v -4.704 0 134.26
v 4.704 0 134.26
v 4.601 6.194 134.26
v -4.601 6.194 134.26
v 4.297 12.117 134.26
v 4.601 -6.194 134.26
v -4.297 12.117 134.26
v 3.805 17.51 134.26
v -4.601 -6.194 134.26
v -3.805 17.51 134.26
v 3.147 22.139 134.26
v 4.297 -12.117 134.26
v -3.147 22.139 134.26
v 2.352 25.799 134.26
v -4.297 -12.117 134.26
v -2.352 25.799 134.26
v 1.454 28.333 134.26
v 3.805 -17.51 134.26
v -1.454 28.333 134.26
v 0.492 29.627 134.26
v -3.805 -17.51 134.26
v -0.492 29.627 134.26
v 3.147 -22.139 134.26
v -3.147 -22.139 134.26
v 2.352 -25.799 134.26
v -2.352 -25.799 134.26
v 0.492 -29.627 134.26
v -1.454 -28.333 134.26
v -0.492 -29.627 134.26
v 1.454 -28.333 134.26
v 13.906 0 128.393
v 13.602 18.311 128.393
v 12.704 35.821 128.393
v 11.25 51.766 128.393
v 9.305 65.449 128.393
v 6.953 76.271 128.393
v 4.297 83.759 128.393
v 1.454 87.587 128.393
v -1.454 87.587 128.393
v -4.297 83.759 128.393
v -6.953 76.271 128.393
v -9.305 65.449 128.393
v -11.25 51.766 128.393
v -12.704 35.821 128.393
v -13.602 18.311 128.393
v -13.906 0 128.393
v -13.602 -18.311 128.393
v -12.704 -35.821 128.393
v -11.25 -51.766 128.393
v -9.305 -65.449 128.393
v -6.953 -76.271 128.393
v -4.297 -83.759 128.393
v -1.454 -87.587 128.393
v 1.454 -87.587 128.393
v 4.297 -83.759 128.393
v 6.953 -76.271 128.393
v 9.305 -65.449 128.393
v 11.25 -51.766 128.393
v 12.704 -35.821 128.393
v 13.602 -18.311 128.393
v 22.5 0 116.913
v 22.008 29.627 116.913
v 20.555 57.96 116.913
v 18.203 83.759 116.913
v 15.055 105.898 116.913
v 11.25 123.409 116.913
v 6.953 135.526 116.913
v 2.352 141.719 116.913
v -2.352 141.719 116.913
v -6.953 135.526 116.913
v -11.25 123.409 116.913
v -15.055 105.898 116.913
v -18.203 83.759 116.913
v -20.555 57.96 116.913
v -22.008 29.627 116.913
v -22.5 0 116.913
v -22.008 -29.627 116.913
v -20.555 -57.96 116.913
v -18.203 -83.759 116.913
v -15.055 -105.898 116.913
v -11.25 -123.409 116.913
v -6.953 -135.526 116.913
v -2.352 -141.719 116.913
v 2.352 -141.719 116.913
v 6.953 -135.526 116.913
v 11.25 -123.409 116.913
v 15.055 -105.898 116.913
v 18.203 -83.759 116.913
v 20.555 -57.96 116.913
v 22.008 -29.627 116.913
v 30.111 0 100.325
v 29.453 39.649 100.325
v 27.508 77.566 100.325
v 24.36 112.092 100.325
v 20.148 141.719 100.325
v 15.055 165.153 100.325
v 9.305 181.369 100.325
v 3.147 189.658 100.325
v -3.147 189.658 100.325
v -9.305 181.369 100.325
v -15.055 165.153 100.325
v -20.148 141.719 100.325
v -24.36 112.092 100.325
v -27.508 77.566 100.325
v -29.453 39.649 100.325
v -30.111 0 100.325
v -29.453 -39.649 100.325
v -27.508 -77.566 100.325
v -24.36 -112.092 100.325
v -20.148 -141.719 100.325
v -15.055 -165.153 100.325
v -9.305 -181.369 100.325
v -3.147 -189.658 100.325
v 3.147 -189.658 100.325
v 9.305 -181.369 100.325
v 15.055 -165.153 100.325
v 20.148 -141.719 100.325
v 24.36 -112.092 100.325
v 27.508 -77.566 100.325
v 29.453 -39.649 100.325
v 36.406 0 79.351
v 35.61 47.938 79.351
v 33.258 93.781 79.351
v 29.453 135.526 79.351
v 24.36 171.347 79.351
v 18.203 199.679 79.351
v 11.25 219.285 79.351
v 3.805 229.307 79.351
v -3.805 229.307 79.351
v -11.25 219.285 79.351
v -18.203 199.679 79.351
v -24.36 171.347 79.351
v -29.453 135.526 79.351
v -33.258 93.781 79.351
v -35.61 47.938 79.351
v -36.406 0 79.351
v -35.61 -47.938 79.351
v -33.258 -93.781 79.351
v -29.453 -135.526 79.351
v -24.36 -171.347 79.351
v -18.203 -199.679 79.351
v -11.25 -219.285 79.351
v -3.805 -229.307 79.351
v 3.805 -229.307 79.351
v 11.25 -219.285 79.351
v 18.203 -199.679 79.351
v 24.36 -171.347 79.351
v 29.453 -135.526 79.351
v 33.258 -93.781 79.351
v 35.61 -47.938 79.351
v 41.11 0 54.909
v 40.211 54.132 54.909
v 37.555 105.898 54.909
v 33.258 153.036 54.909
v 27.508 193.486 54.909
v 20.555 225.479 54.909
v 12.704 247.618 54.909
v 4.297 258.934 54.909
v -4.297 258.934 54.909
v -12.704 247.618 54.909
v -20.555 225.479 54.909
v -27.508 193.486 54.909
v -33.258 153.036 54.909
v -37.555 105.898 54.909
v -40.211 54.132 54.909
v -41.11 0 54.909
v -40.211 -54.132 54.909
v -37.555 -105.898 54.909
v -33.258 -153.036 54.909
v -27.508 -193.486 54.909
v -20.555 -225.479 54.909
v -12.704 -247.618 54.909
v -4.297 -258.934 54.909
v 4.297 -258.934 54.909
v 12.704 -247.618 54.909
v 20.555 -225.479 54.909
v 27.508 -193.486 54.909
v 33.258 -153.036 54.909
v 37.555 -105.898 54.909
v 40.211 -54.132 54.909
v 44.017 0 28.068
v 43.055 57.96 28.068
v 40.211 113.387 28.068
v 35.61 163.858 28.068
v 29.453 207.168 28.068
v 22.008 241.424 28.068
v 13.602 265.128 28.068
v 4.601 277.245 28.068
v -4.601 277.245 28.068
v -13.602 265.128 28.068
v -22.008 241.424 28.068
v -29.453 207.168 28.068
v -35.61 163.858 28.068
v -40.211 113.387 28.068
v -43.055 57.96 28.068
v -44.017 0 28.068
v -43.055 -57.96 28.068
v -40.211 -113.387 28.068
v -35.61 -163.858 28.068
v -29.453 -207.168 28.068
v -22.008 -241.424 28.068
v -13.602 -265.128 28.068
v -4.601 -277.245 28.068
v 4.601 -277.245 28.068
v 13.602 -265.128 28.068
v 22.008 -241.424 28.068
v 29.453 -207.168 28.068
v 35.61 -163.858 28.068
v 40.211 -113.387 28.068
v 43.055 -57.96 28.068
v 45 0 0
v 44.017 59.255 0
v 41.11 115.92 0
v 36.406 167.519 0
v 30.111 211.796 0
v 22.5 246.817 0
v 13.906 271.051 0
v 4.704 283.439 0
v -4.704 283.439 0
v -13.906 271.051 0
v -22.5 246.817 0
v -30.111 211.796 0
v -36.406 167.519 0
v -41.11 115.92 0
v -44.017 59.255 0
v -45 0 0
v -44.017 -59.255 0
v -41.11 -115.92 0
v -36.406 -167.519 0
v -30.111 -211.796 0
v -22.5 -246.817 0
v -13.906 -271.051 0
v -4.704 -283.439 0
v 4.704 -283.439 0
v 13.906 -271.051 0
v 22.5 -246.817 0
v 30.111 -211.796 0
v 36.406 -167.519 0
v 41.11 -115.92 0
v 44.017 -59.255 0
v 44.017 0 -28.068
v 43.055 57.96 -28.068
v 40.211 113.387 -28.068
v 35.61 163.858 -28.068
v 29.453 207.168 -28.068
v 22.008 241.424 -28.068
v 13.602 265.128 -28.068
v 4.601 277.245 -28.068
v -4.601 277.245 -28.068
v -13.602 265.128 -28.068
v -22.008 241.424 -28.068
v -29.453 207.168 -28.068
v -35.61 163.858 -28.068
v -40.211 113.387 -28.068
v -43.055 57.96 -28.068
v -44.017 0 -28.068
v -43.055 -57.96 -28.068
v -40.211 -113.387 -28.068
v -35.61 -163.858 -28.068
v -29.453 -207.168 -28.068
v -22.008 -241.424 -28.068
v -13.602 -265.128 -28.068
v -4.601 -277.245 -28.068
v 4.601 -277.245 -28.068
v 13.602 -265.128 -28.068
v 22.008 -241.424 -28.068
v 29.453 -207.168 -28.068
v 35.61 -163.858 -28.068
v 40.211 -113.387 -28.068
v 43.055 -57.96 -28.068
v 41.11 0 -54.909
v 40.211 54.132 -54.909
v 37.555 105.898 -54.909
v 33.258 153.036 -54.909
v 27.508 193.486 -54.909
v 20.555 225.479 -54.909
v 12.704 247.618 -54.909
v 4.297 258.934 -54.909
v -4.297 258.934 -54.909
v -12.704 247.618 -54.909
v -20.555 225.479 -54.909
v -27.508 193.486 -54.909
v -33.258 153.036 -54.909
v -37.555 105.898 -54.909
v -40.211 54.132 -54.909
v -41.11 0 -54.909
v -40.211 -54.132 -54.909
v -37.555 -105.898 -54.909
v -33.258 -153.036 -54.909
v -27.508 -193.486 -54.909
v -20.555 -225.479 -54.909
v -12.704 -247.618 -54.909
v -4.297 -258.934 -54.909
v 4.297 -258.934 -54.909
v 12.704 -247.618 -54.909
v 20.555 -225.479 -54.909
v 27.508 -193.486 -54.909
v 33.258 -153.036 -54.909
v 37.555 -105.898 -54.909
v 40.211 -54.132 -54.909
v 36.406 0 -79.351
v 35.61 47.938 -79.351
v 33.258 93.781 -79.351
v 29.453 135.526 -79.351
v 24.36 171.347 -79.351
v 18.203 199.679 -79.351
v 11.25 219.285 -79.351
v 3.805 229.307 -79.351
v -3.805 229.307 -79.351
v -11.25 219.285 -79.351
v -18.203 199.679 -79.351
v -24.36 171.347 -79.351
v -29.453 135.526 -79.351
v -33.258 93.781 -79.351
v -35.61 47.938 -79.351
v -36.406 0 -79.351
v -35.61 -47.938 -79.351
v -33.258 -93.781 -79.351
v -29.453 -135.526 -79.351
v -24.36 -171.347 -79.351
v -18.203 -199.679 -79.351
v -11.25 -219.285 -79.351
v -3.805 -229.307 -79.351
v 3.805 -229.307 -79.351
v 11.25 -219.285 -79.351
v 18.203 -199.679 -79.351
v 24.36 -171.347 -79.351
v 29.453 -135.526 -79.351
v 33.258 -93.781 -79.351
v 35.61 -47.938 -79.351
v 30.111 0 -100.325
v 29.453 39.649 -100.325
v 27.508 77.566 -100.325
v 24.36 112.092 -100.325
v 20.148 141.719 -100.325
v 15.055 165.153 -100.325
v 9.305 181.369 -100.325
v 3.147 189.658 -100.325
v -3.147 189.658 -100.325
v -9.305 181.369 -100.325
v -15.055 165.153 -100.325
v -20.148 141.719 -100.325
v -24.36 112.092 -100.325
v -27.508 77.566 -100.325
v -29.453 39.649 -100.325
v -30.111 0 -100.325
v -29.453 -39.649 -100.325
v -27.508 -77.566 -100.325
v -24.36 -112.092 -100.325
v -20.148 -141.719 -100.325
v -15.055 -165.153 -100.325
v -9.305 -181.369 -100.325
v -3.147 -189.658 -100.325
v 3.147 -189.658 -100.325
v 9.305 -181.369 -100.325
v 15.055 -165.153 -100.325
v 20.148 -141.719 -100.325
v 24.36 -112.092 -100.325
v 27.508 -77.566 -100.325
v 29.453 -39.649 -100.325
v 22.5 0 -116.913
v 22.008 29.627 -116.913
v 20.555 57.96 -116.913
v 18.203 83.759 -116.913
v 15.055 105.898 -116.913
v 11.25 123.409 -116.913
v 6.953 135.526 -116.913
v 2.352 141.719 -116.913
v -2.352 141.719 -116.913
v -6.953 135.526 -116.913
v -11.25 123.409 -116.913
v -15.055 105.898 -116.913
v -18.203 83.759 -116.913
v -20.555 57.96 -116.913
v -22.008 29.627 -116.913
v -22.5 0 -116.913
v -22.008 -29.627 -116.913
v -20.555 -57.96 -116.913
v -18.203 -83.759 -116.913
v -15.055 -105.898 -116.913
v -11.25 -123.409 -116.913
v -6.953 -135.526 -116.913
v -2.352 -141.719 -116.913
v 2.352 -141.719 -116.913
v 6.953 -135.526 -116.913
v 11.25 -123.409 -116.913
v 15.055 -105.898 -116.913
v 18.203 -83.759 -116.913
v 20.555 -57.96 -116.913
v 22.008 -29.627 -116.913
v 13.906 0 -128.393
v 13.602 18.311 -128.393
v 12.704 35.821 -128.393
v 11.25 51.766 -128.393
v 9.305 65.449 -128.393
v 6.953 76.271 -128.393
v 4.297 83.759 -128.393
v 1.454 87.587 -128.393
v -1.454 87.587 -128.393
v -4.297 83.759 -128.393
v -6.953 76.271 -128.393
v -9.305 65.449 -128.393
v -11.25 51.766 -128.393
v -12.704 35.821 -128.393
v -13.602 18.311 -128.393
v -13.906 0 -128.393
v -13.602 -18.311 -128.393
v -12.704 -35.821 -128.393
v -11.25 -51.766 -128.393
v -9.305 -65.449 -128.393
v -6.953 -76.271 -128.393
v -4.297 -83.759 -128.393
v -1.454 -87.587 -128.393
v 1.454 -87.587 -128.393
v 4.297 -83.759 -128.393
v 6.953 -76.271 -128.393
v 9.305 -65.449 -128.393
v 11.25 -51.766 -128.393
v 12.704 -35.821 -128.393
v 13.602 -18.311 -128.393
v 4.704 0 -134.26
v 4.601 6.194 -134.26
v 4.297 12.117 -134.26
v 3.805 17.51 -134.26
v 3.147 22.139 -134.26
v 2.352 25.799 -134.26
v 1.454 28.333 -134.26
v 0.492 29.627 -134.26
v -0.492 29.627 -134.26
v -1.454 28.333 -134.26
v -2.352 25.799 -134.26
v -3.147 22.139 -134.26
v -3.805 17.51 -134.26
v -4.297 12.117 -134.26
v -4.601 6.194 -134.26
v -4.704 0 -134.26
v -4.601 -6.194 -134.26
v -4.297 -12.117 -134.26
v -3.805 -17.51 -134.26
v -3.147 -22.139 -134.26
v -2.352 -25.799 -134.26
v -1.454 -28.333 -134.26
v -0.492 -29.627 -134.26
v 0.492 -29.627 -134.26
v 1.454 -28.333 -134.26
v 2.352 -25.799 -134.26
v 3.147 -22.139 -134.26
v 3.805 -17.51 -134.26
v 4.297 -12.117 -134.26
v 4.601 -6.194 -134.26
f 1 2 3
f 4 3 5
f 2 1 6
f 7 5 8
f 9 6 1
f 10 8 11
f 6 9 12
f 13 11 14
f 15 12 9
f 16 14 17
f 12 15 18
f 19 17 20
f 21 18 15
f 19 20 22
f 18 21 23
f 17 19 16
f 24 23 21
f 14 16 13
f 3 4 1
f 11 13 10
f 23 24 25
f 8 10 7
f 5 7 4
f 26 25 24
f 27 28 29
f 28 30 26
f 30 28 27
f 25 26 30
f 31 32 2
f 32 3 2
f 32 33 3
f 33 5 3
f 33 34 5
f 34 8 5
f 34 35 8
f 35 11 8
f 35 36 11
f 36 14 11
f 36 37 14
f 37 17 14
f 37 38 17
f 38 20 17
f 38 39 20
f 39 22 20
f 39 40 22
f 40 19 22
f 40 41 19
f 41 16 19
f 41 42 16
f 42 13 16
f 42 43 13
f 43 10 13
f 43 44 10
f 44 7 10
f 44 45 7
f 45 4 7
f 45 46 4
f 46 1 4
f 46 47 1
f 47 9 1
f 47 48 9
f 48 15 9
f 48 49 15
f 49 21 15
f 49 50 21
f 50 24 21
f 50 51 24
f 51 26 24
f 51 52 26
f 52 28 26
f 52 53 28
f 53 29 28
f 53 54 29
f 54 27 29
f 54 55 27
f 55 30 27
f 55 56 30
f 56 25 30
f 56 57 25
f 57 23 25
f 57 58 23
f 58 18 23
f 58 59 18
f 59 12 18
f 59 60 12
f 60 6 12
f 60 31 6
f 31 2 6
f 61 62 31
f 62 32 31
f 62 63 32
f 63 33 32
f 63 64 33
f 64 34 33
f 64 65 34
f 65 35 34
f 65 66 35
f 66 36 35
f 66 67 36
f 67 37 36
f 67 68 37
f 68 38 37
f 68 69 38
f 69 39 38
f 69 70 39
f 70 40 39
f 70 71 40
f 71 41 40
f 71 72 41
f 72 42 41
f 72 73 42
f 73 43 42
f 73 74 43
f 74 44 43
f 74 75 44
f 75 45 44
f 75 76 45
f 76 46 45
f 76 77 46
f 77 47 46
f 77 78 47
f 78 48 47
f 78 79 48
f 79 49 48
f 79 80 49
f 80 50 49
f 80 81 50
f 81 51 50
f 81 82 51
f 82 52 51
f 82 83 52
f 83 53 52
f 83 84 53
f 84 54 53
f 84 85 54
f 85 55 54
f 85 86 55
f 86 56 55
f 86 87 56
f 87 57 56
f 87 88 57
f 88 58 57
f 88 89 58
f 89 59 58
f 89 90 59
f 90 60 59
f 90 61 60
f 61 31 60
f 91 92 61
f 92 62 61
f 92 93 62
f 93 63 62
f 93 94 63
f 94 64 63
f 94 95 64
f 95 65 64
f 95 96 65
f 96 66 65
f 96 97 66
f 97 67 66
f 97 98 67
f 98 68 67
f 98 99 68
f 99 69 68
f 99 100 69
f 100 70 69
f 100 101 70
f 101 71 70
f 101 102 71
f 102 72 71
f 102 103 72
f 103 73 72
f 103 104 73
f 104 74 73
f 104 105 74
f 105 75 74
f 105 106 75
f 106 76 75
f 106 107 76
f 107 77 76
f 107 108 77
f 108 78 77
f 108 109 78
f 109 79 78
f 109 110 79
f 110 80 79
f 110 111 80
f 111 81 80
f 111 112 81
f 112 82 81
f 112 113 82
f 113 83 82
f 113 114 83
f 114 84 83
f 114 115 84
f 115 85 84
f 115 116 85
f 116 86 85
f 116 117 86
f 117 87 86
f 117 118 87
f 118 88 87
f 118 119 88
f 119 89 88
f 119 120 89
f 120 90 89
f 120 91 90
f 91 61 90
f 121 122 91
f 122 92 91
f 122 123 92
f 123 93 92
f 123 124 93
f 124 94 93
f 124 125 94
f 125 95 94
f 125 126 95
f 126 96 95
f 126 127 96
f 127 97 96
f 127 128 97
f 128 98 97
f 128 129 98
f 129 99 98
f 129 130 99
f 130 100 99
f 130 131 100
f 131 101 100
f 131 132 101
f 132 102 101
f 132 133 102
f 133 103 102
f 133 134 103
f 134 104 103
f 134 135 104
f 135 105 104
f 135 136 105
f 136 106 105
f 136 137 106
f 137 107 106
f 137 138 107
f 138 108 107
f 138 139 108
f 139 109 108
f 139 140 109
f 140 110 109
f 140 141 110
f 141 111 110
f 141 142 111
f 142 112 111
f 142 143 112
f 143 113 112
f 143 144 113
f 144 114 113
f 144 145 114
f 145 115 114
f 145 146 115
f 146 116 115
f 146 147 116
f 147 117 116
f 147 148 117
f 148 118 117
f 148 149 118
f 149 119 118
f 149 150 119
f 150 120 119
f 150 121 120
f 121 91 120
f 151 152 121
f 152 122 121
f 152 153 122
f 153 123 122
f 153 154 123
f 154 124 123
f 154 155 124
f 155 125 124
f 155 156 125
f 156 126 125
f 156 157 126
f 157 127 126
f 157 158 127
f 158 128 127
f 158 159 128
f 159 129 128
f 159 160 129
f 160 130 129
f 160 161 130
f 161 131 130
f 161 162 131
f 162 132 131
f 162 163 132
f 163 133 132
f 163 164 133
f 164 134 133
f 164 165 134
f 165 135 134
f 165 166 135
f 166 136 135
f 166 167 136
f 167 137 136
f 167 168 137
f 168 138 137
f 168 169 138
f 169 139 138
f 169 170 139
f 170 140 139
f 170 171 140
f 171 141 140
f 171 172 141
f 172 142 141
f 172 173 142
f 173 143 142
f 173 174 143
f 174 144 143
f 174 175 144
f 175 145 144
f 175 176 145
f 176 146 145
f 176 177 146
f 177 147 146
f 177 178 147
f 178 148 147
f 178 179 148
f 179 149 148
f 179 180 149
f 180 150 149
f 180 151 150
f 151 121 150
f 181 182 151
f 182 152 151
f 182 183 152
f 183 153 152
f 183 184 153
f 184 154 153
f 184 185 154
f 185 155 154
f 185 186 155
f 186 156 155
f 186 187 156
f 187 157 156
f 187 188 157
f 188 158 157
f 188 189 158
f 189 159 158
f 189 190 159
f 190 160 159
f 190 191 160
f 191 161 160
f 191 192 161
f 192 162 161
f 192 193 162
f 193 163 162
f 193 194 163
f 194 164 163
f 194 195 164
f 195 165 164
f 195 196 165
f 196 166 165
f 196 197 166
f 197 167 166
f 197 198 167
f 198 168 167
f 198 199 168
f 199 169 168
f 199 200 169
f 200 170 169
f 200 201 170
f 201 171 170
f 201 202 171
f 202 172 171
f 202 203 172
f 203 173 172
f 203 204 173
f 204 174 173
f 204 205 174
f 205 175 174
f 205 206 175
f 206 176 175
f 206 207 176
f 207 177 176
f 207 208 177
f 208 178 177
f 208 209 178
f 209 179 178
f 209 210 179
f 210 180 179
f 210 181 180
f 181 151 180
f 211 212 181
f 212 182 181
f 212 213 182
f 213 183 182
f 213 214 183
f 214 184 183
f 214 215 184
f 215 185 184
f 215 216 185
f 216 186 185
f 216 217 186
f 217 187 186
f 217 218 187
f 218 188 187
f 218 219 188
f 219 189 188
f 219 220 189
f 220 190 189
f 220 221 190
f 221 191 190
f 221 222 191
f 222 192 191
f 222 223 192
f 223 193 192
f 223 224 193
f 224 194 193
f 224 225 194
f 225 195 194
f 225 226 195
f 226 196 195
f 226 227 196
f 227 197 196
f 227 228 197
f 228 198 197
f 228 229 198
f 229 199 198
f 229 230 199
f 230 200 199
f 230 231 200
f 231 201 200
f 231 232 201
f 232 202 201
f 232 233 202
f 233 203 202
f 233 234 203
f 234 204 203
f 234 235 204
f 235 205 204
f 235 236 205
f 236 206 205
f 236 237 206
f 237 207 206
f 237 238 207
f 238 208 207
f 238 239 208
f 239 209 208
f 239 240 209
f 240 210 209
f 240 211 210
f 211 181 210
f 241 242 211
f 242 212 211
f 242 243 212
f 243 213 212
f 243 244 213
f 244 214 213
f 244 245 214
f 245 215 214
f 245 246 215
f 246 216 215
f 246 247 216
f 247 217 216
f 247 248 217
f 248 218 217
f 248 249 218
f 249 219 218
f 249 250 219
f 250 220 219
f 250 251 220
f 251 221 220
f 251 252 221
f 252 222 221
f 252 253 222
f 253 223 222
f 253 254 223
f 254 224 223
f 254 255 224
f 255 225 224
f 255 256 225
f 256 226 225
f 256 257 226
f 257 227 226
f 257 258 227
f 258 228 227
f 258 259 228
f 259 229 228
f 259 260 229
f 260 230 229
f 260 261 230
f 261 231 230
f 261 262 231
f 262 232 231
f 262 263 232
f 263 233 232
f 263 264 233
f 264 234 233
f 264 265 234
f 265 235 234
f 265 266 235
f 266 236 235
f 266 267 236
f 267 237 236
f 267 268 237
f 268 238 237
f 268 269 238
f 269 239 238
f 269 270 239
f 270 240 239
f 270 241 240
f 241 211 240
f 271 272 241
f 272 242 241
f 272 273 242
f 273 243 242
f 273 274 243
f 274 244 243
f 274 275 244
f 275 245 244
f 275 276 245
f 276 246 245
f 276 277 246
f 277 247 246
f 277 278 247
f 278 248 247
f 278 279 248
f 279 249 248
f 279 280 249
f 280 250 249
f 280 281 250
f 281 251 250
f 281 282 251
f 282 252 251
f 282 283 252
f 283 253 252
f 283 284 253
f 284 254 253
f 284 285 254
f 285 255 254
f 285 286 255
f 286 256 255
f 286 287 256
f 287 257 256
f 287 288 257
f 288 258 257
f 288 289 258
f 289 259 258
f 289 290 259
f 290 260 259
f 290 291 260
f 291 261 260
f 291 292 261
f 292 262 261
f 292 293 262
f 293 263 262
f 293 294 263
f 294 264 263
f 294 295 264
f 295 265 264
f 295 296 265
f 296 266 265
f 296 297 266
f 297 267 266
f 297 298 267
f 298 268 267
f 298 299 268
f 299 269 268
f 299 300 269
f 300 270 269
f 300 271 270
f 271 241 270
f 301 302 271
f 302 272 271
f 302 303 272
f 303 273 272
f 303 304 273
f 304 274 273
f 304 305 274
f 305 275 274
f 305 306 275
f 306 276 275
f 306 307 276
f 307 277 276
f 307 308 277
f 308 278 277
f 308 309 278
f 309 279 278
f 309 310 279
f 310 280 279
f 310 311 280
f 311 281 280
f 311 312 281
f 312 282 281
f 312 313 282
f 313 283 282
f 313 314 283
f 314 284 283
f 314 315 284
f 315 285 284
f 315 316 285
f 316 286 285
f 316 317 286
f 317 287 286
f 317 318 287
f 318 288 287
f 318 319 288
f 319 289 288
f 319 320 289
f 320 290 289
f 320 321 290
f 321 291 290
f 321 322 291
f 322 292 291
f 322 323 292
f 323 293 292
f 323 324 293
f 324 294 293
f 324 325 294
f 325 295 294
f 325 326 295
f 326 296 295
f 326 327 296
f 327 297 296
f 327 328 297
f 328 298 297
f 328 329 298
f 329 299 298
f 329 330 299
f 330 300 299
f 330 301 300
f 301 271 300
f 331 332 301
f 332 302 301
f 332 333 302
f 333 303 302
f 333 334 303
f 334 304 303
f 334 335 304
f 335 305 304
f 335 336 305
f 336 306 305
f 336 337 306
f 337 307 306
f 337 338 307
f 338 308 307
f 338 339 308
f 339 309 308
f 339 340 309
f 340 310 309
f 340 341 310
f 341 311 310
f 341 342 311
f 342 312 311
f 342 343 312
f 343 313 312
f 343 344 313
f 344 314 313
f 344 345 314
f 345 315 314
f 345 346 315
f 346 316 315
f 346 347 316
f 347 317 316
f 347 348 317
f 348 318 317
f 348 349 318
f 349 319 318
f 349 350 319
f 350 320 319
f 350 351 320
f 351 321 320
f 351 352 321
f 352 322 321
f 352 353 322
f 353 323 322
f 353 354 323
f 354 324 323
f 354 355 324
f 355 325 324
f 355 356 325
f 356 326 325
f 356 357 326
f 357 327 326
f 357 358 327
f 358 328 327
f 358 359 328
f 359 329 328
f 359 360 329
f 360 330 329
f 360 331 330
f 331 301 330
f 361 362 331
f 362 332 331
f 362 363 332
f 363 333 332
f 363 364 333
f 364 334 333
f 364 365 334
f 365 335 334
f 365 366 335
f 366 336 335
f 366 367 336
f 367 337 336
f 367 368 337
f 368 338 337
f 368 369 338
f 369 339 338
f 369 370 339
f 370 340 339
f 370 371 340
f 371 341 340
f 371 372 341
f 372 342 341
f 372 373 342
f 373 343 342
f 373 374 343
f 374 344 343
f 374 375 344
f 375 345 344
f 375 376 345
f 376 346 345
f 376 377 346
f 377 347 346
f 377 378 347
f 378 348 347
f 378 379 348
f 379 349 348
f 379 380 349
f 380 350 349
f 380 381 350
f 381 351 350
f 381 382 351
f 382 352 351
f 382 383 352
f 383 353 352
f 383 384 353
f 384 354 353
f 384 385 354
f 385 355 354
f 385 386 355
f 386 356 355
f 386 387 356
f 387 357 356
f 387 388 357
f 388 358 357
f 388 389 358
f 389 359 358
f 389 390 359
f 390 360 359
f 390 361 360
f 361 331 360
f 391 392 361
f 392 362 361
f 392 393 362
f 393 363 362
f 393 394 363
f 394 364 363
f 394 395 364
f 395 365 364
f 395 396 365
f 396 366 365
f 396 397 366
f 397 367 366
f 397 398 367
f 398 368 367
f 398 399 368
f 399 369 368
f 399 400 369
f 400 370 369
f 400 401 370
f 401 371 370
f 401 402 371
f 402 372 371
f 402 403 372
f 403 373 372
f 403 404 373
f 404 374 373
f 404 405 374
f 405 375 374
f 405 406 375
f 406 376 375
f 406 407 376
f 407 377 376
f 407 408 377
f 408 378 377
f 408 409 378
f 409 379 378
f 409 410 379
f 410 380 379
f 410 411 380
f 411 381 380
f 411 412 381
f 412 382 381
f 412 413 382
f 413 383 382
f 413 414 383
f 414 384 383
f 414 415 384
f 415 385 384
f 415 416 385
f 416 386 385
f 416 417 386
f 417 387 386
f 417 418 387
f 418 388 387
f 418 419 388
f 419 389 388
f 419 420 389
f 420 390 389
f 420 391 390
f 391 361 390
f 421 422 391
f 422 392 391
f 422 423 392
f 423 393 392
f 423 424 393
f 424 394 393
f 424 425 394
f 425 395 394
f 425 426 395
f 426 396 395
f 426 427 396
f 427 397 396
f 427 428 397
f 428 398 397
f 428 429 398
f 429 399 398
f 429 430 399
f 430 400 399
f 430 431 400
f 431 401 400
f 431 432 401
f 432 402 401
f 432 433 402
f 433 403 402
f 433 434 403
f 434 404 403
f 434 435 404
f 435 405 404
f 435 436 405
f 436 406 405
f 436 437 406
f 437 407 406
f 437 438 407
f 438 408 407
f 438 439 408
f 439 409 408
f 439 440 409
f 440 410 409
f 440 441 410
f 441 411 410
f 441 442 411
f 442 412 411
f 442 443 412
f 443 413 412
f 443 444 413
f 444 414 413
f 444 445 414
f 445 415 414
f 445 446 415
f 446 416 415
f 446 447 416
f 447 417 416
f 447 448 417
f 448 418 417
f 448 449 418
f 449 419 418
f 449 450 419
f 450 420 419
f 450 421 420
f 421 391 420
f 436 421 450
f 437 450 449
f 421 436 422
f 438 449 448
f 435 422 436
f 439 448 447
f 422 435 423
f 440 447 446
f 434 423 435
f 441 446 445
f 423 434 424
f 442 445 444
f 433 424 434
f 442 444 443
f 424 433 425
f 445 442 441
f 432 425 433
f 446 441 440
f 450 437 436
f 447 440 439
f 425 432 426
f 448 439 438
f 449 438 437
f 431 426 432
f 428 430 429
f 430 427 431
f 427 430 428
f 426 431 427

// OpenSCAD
// Generated by SolidPython 1.0.1 on 2020-07-29 00:46:46


scale(v = [3, 19, 9]) {
	sphere(r = 15);
}
/***********************************************
*********      SolidPython code:      **********
************************************************
 
# import packages: SolidPython
from solid import *
from solid.utils import *
from itertools import chain, combinations, permutations


class Resize:

    def __init__(self, scad_file):
        self.scad_file = scad_file
        #self.scad_file = import_scad(scad_file)
        # cone/cylinder param:
        self.r1 = 0
        self.r2 = 0
        self.h = 0
        # rectangular prism param:
        self.w = 0
        self.l = 0
        # ellipse param:
        self.r = 0

    # import OpenScad code (file name corresponds to shape)


    # classify shape + parameters
    def assign(self, param1, param2, param3):
        if self.scad_file == 'cone.scad':
            self.r1 = param1
            self.r2 = param2
            self.h = param3
        elif self.scad_file == 'cylinder.scad':
            self.r1 = param1
            self.r2 = param2
            self.h = param3
        elif self.scad_file == 'rectangularPrism.scad':
            self.h = param1
            self.l = param2
            self.w = param3
        else:
            self.r = param1
            self.h = param2

    # resize parameters
    def iterate(self):
        x = range(3, 20, 2)
        i = 1
        if self.scad_file == 'cone.scad':
            tempList = list(permutations(x, 2))
            for temp in tempList:
                param1 = temp[0]
                param2 = temp[1]
                filepath = 'produced_scad_files/' + 'cone' + str(param1) + '_' + str(param2) + '_' + '.scad'
                scad_render_to_file(cylinder(h=param1, r1=param2, r2=0), filepath)

        elif self.scad_file == 'cylinder.scad':
            tempList = list(permutations(x, 3))
            for temp in tempList:
                param1 = temp[0]
                param2 = temp[1]
                filepath = 'produced_scad_files/' + 'cylinder' + str(param1) + '_' + str(param2) + '_' + '.scad'
                scad_render_to_file(cylinder(h=param1, r1=param2, r2=param2), filepath)

        elif self.scad_file == 'rectangularPrism.scad':
            tempList = list(permutations(x, 3))
            for temp in tempList:
                param1 = temp[0]
                param2 = temp[1]
                param3 = temp[2]
                filepath = 'produced_scad_files/' + 'rectangularPrism' + str(param1) + '_' + str(param2) + '_' + str(
                    param3) + '.scad'
                scad_render_to_file(cube(size=(param1, param2, param3)), filepath)

        elif self.scad_file == 'ellipse.scad':
            tempList = list(permutations(x, 4))
            for temp in tempList:
                param1 = temp[0]
                param2 = temp[1]
                param3 = temp[2]
                param4 = temp[3]
                filepath = 'produced_scad_files/' + 'ellipse' + str(param1) + '_' + str(param2) + '_' + str(param3) + '_' + str(param4) + '.scad'
                scad_render_to_file(scale([param1, param2, param3])(sphere(r=param4)), filepath)

    def render_to_scadfile(self):
        scad_render_to_file(scad, 'example.scad') 
 
************************************************/
